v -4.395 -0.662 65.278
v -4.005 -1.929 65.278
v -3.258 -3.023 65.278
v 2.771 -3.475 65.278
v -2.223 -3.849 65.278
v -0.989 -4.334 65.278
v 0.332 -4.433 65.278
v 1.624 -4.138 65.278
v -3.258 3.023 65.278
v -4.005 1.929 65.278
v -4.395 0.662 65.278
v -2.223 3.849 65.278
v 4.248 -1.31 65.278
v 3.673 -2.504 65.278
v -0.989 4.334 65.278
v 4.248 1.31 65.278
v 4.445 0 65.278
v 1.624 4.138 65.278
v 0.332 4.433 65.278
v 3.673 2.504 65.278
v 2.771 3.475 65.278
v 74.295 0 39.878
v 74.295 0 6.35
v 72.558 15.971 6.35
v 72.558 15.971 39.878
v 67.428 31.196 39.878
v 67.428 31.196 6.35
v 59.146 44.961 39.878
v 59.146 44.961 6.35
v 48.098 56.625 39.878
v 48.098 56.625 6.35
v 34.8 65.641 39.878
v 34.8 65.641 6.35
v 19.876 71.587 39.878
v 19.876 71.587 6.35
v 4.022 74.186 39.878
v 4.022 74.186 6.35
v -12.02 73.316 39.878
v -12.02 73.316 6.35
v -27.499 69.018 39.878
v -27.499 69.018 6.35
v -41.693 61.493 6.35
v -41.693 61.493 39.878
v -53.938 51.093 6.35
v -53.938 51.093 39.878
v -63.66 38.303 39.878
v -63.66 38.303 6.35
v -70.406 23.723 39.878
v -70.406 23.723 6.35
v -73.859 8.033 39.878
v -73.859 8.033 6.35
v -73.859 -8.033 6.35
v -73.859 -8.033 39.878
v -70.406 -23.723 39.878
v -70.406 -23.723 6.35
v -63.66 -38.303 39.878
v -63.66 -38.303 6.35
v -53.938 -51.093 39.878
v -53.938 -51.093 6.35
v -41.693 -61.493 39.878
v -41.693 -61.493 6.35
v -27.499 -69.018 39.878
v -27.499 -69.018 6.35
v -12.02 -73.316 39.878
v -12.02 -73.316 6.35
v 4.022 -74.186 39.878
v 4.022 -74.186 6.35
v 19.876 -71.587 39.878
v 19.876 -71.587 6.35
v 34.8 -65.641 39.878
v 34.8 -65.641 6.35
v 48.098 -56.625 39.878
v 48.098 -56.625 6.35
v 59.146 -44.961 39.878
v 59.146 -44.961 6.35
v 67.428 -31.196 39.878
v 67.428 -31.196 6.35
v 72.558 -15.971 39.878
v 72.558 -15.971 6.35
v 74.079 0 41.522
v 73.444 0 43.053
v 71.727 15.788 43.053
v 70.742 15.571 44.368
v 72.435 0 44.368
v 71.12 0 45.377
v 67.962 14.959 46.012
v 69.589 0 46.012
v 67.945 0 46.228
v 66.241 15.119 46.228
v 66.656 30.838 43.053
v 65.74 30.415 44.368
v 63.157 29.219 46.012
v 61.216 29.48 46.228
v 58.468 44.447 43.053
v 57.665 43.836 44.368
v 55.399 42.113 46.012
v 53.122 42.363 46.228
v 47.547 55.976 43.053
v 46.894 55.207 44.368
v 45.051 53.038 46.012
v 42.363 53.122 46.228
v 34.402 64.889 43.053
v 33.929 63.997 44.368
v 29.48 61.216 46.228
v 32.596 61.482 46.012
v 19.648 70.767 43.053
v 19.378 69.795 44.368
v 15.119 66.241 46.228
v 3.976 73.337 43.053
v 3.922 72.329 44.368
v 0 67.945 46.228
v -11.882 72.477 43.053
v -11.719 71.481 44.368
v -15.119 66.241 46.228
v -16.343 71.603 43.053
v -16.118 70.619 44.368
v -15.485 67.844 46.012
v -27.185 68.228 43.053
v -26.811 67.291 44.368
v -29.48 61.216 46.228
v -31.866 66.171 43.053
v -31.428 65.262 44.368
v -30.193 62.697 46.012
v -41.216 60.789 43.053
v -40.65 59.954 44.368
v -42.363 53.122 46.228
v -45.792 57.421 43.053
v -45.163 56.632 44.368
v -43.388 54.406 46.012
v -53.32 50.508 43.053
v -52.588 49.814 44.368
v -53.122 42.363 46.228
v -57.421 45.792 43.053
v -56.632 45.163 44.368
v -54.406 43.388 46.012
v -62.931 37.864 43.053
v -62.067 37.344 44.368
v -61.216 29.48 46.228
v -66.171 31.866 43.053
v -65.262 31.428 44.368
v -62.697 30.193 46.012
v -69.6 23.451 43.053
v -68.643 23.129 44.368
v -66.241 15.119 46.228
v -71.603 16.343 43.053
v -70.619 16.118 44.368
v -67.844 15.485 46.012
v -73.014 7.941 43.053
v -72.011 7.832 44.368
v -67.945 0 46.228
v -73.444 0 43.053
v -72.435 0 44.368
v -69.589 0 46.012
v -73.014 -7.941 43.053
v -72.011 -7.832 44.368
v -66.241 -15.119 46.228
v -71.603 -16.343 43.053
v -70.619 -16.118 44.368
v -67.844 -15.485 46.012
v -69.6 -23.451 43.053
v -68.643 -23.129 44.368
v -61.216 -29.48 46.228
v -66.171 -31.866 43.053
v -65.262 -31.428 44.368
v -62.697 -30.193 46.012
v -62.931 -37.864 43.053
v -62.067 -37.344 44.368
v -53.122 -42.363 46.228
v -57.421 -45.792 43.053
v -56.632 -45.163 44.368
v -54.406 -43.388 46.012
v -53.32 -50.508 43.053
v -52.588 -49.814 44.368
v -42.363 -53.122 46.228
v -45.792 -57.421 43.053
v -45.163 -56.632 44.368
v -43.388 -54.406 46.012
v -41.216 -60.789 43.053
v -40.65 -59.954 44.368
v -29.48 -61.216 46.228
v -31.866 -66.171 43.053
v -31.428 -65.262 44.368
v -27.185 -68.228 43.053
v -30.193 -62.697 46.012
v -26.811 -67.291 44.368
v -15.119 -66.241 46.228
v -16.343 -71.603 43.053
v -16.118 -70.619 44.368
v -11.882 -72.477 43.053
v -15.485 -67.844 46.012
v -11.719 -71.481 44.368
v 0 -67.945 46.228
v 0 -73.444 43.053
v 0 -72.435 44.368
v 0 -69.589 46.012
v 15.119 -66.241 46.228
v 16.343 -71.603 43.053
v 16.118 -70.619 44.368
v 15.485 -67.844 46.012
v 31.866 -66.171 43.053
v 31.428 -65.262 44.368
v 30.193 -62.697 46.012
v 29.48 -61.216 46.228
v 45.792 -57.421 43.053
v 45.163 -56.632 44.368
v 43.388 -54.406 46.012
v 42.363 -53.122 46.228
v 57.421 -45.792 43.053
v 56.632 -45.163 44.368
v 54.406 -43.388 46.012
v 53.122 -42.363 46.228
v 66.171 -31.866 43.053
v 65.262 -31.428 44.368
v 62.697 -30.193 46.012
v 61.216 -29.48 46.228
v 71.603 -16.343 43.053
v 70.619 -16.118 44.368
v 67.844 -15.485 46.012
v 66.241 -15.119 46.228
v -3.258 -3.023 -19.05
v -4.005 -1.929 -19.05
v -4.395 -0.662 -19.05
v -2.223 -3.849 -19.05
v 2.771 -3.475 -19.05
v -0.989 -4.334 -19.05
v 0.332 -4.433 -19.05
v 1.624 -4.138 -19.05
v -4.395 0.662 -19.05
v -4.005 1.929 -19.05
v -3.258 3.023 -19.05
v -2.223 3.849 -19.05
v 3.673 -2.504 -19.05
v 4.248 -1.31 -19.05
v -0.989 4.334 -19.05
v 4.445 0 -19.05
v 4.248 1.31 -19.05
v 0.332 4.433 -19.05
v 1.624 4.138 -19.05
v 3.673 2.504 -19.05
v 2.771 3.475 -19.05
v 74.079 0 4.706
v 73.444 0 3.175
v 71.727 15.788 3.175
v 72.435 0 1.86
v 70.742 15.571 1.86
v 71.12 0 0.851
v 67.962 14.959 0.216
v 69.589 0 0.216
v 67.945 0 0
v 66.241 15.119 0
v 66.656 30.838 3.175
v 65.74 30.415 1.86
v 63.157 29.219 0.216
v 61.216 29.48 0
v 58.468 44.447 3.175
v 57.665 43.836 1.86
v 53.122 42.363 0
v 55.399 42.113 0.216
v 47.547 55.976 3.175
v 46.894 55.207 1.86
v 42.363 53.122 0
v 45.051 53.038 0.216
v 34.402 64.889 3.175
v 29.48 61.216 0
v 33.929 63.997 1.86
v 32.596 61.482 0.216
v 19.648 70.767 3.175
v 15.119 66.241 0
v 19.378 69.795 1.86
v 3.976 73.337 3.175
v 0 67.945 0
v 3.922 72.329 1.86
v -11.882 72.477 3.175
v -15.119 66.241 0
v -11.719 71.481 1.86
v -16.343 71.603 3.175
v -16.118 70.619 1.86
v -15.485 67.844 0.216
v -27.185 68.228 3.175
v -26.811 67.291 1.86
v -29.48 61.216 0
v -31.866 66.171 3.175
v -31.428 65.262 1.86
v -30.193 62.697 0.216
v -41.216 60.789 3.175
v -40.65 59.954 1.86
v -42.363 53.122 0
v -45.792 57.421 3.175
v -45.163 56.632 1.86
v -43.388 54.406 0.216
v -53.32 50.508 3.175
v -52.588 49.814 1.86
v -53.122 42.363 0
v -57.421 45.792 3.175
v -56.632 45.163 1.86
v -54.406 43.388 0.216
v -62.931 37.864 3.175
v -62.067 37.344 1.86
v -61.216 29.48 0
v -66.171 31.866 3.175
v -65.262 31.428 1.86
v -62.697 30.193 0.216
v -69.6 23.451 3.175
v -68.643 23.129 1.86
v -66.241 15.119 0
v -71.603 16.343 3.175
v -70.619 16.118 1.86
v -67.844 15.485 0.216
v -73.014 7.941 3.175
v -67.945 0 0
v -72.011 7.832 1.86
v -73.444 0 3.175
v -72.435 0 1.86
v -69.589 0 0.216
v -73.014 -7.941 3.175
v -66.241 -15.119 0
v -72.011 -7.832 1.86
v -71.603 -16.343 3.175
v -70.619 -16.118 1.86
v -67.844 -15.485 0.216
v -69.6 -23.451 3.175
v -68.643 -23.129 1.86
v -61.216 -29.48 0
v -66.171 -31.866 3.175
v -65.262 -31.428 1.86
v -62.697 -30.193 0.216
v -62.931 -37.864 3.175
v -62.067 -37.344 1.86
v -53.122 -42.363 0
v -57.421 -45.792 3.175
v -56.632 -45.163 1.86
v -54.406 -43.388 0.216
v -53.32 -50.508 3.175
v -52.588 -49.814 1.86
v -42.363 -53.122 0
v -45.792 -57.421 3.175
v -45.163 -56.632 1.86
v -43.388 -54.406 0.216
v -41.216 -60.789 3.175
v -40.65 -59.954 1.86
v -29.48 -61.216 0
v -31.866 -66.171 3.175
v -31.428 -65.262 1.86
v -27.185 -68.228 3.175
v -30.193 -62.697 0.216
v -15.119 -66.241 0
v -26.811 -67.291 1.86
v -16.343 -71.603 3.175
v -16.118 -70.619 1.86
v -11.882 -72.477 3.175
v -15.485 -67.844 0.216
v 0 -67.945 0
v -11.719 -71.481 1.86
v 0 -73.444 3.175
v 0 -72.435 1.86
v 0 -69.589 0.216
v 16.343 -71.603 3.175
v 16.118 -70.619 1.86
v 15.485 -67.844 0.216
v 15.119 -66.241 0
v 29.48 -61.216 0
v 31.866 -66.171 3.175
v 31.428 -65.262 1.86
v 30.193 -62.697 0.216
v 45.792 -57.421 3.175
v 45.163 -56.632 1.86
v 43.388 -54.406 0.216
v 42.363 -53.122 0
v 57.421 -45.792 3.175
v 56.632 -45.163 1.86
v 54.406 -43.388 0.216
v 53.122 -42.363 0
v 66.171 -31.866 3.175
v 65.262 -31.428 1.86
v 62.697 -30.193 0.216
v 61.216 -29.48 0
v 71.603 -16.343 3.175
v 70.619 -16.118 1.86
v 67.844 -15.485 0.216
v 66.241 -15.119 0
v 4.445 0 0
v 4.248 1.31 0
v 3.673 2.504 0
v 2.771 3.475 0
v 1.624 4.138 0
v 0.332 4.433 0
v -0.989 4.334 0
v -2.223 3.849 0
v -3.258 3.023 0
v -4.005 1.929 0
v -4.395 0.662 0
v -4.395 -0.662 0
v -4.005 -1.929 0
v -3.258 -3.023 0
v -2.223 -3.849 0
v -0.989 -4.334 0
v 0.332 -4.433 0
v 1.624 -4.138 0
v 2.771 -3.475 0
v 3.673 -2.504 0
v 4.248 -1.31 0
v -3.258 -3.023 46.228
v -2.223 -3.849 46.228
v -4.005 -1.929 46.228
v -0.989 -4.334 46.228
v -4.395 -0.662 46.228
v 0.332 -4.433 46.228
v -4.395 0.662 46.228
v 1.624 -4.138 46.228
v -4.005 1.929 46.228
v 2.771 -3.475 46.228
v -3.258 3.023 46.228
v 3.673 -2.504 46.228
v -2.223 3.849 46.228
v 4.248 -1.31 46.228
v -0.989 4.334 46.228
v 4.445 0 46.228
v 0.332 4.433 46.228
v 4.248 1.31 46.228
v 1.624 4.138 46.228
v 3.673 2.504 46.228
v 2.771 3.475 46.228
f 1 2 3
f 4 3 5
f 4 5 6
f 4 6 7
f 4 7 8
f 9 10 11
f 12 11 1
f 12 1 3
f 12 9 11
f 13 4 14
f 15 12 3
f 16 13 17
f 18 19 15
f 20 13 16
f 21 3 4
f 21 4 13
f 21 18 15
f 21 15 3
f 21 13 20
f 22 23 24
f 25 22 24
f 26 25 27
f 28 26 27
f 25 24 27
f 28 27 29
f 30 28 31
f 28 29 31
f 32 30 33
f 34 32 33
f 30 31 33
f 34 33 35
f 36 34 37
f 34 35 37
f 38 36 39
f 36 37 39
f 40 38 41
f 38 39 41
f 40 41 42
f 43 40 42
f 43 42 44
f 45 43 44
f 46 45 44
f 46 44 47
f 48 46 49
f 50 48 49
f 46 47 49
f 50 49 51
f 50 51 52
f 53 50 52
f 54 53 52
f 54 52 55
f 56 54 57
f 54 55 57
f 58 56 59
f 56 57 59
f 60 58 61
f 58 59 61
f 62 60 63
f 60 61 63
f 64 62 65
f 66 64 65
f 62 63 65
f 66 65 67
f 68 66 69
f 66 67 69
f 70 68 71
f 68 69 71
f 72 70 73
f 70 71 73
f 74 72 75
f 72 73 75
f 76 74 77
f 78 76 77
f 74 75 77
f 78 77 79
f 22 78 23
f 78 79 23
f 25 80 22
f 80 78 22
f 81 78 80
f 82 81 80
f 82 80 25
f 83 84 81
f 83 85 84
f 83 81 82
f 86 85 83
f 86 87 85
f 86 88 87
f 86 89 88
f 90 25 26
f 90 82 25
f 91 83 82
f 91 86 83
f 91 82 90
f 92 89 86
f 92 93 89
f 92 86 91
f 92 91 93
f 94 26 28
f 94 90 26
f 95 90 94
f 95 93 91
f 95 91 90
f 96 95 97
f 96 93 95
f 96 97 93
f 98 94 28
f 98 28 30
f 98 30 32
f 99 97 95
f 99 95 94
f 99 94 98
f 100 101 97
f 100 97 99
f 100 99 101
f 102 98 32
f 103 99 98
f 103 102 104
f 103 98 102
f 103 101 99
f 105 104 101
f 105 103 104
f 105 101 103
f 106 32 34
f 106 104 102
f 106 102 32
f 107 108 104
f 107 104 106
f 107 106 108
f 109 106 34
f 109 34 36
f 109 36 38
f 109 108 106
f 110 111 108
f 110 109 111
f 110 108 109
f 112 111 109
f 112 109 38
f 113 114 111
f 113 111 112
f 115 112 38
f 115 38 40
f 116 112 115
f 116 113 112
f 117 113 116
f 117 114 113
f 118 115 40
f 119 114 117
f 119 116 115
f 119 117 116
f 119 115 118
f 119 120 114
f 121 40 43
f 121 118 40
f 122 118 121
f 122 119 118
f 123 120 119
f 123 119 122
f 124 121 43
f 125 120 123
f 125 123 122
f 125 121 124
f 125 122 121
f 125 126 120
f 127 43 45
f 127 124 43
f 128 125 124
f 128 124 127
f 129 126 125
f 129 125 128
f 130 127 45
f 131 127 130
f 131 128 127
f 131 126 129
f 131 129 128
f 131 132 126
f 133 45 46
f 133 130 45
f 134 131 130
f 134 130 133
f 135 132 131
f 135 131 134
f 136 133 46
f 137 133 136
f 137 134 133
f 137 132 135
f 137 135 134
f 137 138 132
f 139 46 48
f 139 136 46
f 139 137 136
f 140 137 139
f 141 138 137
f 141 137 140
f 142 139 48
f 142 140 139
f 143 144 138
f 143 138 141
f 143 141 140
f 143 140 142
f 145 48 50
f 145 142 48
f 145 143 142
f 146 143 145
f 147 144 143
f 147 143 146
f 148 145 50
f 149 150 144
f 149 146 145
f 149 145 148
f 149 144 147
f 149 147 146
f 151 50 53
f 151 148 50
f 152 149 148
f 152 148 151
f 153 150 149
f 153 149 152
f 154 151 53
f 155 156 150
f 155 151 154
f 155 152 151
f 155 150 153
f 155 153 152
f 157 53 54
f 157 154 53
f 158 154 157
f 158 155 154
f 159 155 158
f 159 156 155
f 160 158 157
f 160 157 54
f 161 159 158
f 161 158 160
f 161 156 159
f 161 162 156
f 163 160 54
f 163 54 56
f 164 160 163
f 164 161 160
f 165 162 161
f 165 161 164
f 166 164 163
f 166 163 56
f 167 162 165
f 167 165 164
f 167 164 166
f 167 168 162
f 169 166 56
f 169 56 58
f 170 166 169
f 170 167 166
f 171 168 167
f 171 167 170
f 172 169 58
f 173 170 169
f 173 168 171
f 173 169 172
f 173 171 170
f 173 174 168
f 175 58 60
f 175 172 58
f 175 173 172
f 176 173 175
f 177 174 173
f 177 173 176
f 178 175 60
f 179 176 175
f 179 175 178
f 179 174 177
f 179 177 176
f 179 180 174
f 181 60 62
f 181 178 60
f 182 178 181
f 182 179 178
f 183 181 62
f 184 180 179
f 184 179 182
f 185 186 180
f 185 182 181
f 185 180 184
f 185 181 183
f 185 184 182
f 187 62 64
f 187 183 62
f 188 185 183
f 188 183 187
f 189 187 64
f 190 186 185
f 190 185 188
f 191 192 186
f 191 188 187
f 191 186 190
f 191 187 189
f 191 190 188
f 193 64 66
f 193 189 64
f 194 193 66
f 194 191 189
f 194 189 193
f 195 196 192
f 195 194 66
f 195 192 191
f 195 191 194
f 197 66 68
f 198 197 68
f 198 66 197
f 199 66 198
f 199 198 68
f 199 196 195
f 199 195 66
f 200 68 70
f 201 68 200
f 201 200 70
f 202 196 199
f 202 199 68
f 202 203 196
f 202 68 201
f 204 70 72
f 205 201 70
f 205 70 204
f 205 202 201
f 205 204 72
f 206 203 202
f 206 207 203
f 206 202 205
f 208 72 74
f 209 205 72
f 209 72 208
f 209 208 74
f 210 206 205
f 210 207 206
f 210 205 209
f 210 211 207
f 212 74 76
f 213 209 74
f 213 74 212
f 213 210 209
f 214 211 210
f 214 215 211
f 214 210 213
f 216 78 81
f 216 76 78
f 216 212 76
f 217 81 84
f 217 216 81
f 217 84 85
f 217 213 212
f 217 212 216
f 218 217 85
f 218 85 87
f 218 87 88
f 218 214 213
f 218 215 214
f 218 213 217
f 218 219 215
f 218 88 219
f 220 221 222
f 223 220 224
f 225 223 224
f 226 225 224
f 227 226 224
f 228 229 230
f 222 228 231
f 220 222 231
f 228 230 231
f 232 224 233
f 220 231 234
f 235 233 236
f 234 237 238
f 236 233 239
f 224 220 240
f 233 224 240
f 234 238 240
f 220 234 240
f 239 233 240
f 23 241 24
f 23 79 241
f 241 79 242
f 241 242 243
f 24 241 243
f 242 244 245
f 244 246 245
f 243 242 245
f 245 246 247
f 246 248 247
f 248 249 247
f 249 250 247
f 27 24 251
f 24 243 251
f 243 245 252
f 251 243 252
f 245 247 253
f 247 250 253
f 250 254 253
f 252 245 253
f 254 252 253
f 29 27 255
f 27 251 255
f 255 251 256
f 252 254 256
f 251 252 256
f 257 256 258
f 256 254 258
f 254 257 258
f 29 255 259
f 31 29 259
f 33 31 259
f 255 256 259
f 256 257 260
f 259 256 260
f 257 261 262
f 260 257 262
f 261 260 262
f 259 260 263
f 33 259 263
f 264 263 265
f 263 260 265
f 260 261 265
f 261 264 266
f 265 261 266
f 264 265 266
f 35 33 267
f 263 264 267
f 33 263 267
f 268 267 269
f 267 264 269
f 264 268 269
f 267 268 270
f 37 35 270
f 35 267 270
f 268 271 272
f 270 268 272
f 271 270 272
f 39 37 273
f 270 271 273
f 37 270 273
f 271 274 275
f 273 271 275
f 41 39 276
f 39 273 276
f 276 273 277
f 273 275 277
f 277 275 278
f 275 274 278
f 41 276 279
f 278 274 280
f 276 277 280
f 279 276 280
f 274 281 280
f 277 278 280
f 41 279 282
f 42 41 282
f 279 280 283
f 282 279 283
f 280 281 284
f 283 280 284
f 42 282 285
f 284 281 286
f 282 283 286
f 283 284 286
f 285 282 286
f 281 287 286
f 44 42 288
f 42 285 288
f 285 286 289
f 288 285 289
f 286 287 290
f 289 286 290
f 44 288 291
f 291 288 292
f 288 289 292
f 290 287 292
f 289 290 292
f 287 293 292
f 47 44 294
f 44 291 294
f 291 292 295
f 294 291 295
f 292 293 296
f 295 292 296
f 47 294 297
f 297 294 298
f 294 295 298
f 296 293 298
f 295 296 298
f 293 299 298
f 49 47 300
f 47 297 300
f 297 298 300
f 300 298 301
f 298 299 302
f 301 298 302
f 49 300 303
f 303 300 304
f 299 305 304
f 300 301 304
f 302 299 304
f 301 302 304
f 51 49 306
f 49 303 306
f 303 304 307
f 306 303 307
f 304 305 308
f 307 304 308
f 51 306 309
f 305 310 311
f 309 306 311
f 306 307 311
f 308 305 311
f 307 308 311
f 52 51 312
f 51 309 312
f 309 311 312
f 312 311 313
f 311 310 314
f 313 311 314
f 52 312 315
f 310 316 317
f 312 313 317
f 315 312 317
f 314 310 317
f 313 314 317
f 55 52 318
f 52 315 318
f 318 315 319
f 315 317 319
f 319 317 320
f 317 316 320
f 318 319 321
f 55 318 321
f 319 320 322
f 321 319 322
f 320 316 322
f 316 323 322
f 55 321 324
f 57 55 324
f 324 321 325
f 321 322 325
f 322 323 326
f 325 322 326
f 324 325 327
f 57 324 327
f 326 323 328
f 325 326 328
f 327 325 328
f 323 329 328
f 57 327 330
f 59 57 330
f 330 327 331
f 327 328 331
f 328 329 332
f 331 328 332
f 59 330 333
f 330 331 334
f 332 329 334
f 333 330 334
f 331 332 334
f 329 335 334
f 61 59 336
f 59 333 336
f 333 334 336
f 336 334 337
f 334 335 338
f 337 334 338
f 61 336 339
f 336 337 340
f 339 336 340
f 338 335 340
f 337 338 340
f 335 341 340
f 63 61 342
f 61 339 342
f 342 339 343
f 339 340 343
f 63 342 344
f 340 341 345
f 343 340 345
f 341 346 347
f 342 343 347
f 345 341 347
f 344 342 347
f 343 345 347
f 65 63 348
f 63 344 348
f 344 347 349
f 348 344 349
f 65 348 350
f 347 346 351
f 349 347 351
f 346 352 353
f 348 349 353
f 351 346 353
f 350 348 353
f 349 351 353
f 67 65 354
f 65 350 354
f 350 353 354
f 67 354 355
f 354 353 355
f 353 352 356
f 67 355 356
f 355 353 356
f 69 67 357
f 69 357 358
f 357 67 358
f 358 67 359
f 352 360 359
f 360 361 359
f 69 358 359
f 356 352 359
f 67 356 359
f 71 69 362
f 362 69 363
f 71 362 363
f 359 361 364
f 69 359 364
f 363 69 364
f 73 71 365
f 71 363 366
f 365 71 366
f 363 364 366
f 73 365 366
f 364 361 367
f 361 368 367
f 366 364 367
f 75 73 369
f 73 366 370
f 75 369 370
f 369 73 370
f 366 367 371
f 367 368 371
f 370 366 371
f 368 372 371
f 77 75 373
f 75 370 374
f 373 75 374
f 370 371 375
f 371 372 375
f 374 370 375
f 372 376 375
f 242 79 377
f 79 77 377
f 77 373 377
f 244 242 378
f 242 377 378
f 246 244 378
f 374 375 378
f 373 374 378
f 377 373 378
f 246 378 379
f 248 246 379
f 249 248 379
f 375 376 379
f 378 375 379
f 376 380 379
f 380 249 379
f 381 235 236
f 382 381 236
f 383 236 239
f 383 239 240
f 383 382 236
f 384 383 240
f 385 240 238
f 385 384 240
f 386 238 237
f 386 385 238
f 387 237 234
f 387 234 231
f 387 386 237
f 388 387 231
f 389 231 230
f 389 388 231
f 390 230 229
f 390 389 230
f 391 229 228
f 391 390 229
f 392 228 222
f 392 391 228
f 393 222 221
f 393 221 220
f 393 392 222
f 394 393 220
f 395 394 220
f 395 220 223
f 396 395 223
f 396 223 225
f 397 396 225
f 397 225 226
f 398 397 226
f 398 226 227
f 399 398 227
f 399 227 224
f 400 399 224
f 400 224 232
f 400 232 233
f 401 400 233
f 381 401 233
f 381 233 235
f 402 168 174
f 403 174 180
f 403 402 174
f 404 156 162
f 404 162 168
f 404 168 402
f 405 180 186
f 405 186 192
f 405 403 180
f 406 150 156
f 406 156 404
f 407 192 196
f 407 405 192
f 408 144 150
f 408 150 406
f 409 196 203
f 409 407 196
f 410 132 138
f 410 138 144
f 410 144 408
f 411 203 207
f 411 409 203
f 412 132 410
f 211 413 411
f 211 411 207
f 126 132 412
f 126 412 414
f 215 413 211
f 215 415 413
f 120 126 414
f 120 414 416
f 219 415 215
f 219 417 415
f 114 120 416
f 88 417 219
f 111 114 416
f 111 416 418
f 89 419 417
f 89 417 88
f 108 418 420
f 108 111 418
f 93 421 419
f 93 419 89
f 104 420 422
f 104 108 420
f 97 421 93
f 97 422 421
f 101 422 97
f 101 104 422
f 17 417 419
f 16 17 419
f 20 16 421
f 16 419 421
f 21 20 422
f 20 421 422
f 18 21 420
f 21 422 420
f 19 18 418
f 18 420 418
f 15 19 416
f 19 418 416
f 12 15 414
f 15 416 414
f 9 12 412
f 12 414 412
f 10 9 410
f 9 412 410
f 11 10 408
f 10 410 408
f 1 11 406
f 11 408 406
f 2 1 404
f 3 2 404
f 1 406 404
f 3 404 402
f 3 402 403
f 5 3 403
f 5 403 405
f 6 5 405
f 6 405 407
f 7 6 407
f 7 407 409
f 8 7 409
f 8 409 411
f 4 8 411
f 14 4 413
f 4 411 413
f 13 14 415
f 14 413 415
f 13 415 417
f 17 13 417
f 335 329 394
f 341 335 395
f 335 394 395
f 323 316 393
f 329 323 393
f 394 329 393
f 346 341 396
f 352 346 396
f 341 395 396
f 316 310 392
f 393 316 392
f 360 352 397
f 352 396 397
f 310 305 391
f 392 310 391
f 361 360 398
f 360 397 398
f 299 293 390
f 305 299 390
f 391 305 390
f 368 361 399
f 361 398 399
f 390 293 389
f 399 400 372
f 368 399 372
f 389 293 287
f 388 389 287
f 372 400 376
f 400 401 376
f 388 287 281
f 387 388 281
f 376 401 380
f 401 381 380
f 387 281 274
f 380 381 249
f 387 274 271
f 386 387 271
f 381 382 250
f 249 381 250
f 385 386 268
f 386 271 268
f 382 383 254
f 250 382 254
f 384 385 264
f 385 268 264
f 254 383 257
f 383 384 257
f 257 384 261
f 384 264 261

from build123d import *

# Parameters (mm, degrees)
SKETCH1_R                = 74.295
BOSS_EXTRUDE1_DEPTH      = 46.228
FILLET1_R                = 6.35
SKETCH2_R                = 4.445
BOSS_EXTRUDE2_DEPTH      = 19.05
BOSS_EXTRUDE2_DEPTH_BACK = 65.278


with BuildPart() as part:
    # Sketch1 → Boss-Extrude1 (new body)
    with BuildSketch(Plane.XY):
        Circle(SKETCH1_R)
    extrude(amount=BOSS_EXTRUDE1_DEPTH)

    # Fillet1
    fillet1_edges = [part.edges().sort_by_distance(p)[0] for p in [
        (-74.295, 0, 0),
        (-74.295, 0, 46.228),
    ]]
    fillet(fillet1_edges, radius=FILLET1_R)

    # Sketch2 → Boss-Extrude2 (add, two sides)
    with BuildSketch(Plane.XY.offset(46.228)) as boss_extrude2_sk:
        Circle(SKETCH2_R)
    extrude(amount=BOSS_EXTRUDE2_DEPTH)
    extrude(boss_extrude2_sk.sketch, amount=-BOSS_EXTRUDE2_DEPTH_BACK)


solid = part.part
